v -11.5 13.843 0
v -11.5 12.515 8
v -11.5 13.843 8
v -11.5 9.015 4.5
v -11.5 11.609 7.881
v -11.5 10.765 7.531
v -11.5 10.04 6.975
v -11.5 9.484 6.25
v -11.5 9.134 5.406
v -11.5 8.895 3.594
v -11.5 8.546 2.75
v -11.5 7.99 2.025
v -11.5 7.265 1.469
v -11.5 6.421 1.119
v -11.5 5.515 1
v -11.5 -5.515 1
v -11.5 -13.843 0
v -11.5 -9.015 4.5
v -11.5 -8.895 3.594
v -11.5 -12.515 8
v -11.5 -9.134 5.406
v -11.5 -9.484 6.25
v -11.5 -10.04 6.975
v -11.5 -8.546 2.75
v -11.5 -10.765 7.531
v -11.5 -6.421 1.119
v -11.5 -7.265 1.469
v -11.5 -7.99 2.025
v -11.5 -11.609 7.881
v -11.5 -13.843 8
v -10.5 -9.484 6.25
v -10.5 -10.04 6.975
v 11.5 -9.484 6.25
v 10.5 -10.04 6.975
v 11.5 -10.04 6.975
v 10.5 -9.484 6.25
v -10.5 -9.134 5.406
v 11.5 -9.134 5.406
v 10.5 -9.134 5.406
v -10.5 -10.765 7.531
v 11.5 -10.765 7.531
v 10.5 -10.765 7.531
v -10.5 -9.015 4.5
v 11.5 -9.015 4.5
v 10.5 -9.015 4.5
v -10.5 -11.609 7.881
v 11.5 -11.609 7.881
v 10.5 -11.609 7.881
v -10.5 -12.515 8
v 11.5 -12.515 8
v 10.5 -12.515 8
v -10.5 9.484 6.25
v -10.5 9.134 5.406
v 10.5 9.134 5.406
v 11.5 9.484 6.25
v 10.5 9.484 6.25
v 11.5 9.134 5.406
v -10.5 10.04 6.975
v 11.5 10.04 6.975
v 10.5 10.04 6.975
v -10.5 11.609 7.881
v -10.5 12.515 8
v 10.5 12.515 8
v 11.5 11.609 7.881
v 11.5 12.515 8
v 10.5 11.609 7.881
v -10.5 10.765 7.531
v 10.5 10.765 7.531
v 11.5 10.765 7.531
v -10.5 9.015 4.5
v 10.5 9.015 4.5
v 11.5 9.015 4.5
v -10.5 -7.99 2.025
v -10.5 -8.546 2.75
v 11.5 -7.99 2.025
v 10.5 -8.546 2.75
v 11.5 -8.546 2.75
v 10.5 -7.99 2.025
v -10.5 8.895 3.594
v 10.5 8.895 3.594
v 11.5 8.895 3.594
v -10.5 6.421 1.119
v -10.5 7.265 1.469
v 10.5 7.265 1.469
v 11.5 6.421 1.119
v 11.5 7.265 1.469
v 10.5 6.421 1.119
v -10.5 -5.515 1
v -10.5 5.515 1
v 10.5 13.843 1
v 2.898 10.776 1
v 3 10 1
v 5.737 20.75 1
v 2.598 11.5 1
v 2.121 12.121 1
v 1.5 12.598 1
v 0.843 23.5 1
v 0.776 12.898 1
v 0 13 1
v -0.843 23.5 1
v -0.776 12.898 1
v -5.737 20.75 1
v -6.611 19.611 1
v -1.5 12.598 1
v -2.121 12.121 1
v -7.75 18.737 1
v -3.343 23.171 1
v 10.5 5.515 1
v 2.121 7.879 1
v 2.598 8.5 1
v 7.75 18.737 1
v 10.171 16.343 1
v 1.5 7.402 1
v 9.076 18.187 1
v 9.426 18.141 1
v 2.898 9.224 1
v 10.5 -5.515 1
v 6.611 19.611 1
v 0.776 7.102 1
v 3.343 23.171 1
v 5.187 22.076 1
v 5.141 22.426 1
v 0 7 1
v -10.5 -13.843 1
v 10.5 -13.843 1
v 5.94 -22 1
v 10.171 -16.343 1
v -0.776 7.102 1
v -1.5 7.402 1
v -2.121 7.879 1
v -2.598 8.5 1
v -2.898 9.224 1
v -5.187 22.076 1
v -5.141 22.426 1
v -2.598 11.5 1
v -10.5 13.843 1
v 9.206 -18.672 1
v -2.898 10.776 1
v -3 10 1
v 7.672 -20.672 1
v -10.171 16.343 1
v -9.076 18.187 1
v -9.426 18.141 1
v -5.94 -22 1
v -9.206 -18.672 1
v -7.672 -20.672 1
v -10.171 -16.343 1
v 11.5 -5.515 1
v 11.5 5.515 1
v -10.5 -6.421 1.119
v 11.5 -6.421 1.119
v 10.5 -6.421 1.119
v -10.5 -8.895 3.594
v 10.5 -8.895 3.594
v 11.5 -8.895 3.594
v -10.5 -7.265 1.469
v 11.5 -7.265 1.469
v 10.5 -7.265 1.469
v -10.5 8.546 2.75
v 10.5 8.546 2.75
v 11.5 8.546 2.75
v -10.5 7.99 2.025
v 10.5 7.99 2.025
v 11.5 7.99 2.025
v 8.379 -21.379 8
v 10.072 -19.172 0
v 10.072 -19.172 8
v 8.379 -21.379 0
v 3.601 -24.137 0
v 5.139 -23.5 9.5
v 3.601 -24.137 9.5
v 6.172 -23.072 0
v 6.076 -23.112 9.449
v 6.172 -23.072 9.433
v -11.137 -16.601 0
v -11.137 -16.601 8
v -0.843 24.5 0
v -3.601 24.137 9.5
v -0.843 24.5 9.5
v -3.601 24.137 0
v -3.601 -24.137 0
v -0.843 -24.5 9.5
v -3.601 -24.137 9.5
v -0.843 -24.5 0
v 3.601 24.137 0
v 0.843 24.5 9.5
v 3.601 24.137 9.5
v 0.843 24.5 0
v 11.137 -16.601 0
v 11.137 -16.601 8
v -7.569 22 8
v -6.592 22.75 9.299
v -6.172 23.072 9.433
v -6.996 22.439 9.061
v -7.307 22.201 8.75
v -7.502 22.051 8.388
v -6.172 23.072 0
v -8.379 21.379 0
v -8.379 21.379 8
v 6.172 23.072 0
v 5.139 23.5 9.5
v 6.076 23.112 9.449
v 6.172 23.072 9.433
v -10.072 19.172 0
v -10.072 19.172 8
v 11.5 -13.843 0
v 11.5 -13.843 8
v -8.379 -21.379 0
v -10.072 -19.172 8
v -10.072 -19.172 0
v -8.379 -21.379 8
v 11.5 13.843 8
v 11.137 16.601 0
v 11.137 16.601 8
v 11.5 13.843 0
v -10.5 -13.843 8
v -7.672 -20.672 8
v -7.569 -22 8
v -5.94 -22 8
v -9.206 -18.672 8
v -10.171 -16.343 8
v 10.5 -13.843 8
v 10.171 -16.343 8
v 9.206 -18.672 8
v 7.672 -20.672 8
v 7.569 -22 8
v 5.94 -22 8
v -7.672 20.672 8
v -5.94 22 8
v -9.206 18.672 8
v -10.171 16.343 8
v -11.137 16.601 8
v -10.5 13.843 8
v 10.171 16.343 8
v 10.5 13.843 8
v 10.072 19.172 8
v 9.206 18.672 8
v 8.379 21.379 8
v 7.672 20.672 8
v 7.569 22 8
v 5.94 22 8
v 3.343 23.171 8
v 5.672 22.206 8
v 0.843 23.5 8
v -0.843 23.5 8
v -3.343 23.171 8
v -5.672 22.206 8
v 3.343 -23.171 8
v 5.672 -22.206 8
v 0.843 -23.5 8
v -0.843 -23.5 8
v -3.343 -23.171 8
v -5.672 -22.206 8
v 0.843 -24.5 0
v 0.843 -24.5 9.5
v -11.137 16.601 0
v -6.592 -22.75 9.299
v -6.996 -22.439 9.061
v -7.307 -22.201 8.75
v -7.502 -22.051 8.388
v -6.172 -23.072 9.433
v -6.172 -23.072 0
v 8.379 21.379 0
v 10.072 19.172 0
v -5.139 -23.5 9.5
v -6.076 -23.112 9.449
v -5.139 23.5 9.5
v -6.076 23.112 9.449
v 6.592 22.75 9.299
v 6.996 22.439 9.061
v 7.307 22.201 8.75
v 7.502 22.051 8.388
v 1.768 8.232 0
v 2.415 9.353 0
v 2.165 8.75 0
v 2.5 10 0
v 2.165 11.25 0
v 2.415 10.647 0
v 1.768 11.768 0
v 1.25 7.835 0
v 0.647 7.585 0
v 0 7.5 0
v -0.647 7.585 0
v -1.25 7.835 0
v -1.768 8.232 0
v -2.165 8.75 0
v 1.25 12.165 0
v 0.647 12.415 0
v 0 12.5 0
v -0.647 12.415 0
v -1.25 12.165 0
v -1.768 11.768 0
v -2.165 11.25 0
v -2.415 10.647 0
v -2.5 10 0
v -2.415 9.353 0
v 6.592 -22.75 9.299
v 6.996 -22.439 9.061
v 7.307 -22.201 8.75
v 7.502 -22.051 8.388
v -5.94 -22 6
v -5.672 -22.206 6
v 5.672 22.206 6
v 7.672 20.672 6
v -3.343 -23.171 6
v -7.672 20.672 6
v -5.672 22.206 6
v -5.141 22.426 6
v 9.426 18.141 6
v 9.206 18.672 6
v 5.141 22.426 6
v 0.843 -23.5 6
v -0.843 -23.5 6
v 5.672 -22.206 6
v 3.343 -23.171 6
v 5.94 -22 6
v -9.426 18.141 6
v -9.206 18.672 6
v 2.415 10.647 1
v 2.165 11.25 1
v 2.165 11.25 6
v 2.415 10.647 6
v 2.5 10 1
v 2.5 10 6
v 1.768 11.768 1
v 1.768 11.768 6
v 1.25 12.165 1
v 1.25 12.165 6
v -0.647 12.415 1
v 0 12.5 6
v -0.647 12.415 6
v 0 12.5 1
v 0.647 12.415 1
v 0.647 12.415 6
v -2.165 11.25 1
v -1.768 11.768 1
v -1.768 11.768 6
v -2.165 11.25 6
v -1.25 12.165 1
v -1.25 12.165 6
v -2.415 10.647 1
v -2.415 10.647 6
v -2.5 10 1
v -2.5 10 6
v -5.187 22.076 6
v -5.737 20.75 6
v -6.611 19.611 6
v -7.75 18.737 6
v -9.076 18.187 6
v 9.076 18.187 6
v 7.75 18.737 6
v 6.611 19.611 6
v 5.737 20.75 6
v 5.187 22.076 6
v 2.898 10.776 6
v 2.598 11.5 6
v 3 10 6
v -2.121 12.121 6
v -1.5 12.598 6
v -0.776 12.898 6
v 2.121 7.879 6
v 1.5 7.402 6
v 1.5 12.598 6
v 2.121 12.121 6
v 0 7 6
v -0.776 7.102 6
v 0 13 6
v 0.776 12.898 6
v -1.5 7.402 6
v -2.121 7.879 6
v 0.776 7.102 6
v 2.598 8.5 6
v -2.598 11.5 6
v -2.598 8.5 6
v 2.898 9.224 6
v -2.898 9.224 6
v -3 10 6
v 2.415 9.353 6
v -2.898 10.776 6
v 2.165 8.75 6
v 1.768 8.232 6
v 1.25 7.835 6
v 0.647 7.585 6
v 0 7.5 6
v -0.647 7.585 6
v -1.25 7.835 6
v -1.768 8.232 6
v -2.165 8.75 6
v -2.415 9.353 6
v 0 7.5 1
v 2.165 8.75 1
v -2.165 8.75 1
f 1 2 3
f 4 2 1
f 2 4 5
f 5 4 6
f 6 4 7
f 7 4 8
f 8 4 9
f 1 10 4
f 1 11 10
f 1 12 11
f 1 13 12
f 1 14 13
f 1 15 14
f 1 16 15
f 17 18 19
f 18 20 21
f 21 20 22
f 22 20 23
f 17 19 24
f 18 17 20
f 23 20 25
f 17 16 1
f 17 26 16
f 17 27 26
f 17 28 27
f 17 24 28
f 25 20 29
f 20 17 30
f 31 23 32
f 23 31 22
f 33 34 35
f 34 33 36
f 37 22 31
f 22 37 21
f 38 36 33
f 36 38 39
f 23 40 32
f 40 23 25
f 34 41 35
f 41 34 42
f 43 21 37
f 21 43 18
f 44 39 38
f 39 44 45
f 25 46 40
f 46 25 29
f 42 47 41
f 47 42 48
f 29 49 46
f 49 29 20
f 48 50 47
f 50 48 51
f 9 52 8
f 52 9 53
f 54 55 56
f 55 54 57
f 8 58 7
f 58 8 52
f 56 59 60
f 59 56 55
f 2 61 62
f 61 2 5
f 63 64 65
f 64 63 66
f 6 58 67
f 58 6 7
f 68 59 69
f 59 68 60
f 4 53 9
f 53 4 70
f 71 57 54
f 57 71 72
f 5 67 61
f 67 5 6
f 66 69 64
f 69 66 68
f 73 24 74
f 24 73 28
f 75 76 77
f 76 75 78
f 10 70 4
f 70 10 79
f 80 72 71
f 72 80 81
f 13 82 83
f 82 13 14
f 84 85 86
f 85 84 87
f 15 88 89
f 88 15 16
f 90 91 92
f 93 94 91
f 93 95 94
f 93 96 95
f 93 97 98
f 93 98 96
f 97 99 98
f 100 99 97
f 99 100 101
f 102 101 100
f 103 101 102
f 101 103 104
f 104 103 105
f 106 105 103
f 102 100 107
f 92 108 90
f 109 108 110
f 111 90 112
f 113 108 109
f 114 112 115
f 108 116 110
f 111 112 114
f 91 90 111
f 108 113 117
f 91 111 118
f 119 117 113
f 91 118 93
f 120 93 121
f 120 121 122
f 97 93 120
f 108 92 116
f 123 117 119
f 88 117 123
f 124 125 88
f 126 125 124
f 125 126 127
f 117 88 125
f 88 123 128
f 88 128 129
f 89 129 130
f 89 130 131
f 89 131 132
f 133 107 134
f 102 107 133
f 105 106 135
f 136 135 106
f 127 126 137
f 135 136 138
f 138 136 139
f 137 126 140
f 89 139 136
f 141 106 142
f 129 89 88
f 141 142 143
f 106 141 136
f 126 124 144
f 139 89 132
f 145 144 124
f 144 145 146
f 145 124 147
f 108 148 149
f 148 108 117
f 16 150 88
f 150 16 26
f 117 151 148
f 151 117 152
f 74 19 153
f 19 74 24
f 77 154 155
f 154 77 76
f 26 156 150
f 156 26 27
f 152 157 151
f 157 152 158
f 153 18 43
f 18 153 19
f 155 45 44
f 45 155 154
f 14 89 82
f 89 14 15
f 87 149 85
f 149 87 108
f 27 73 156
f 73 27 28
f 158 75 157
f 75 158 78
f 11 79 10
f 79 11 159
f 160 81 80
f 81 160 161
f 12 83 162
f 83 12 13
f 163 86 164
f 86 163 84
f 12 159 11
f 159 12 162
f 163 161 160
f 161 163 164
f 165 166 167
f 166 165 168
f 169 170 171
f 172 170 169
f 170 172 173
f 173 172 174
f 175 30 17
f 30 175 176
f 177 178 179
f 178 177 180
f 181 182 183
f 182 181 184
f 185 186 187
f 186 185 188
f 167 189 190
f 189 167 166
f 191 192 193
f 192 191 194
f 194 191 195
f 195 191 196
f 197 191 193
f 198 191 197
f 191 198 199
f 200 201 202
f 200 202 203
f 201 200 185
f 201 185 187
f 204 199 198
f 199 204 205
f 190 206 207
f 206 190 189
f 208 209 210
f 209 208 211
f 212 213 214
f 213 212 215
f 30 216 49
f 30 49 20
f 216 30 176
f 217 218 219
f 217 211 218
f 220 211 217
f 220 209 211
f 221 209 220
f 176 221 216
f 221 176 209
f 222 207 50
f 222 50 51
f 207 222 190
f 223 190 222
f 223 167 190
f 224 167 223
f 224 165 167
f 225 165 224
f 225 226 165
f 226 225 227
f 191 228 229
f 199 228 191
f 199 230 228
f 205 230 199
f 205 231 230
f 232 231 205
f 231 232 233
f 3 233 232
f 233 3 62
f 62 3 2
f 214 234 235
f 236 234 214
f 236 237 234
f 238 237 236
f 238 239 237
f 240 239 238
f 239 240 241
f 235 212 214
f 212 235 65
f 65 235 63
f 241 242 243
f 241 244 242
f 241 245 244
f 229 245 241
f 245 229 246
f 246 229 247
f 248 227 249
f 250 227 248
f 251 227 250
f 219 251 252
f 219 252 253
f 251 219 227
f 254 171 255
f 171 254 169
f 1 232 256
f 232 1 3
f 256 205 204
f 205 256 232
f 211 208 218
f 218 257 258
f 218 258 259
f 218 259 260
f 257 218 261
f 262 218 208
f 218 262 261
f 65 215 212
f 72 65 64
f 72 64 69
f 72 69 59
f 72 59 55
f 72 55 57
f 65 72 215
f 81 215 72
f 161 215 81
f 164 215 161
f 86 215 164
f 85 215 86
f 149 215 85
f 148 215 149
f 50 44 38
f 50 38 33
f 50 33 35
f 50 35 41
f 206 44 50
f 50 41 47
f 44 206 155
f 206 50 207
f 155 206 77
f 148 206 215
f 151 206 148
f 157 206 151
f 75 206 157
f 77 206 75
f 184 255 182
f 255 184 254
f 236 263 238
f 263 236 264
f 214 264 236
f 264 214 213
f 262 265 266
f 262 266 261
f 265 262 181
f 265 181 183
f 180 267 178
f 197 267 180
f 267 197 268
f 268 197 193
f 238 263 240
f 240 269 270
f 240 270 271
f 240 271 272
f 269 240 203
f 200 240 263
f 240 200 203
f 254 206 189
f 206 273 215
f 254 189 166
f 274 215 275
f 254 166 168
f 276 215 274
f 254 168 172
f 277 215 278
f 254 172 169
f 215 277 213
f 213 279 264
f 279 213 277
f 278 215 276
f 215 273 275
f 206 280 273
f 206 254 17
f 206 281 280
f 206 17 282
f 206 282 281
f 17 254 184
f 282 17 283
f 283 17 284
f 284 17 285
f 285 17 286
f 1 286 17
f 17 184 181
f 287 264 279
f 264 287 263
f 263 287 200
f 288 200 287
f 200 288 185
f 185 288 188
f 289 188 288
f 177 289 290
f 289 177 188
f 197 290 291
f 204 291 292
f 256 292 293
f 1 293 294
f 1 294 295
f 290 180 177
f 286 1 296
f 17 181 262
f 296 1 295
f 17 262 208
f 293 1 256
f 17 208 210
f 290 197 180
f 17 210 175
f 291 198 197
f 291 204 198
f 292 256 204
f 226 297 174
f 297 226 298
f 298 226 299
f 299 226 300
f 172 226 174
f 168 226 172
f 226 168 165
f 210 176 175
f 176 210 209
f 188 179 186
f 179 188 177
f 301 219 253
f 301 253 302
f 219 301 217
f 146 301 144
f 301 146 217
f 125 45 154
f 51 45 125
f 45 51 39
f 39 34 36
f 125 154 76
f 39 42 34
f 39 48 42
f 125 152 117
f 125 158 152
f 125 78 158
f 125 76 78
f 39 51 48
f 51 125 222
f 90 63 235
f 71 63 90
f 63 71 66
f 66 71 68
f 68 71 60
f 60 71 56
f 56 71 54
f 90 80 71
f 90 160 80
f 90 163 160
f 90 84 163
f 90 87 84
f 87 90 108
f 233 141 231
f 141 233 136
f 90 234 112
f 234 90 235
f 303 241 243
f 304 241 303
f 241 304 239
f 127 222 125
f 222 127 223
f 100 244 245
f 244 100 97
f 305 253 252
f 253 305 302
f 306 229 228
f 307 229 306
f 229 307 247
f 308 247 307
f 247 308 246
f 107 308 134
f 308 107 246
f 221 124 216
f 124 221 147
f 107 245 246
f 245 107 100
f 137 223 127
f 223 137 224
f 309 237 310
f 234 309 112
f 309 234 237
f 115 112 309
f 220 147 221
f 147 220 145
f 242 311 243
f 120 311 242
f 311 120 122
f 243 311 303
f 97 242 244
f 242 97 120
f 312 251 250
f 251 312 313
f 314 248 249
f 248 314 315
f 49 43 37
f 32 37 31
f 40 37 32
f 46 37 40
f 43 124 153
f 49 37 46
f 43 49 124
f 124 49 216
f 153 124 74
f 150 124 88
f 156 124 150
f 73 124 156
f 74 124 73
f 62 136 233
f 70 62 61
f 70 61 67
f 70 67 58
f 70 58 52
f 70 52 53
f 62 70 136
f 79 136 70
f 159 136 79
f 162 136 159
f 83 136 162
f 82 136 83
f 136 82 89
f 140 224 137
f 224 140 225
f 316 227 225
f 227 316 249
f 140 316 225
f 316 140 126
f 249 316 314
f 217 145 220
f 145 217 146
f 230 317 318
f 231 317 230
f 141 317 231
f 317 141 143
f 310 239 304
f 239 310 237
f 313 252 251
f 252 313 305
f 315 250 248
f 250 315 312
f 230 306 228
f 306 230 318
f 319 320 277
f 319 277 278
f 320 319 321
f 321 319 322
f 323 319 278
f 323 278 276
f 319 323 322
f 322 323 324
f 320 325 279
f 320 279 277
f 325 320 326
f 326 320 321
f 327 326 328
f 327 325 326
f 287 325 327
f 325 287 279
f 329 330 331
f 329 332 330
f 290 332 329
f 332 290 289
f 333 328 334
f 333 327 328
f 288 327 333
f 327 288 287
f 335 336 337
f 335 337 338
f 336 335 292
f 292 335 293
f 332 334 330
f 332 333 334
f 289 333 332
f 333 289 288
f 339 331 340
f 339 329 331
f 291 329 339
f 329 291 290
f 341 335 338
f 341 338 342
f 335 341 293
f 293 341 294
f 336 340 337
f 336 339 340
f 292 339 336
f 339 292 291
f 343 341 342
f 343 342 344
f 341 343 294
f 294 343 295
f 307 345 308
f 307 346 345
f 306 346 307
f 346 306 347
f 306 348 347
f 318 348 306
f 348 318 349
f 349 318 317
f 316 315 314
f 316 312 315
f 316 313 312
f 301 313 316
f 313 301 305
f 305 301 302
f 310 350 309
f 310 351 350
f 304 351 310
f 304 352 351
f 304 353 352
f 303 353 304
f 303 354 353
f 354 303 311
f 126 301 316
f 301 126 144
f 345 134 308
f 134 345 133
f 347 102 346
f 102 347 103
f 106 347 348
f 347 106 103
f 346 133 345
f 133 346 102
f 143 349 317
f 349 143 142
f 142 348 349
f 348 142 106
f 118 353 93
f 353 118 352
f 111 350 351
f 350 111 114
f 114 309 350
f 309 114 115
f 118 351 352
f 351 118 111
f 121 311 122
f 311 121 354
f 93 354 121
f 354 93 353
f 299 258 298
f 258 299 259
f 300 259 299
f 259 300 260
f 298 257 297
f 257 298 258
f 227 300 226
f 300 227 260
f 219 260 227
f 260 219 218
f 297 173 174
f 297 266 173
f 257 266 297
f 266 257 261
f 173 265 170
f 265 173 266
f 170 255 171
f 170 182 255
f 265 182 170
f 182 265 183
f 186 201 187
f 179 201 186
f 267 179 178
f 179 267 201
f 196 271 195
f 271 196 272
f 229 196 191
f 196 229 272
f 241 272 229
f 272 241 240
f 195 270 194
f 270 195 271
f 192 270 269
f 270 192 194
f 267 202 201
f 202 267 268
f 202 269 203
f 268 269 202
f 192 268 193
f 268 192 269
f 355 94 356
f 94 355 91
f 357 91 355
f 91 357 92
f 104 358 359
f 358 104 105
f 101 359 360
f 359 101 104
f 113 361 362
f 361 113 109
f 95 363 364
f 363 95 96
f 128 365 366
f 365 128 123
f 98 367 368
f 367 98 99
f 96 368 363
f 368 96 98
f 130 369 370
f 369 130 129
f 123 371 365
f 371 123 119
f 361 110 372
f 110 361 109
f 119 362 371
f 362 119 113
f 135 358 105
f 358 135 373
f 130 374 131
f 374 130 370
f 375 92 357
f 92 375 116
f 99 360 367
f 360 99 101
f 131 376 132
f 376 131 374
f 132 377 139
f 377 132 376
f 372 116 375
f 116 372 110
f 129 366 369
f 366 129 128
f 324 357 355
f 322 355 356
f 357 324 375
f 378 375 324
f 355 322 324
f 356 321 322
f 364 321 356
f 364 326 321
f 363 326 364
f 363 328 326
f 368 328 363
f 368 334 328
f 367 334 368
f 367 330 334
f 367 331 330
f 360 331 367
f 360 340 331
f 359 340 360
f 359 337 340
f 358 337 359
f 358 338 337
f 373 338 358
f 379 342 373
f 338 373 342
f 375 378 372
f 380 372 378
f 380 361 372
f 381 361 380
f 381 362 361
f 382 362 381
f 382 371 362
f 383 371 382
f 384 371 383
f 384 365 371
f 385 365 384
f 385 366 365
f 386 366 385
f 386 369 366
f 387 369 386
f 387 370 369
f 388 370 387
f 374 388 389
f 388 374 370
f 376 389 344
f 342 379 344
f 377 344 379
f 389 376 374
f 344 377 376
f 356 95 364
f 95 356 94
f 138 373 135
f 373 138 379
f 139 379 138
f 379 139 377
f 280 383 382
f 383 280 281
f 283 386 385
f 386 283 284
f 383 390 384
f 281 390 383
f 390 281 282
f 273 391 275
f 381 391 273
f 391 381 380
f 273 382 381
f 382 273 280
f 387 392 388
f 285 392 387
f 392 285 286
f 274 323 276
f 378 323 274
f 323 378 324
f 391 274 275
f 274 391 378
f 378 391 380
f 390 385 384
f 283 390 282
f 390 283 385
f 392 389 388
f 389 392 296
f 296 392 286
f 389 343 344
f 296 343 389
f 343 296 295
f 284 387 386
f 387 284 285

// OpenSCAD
/*******************************************************************************
* Part: LightBlue Bean Sensor Box
* Rev : 0.1
* Date: 2015-01-19
*******************************************************************************/
$fn=24;
echo(str("$fn = ", $fn));
//boardRadius = 8;
boardRadius = 4 / (sqrt(2)-1);
echo(str("Board Radius = ", boardRadius));
boardLength = 47;  // bumped out 1mm after initial print test
boardWidth = 21;
boardDepth = 2;
boardStandoff = 5;
boardShellWall = 1;
supportWidth = 1.5;
beanFloor = 1;
floorBrim = 5;
cutOutRadius = (boardStandoff + boardDepth) / 2;
snapWidth = 1.5;
irY = 10;  // IR Y distance from origin
irD = 5;  // IR diameter

module boardShape(radius, length, width, height){
  // Center in X,Y and Z=0
  translate([-(width/2-radius),-(length/2-radius),0]){
    hull(){
      translate([0,0,0])
        cylinder(r=radius, h=height);
      translate([width-2*radius,0,0])
        cylinder(r=radius, h=height);
      translate([width-2*radius, length-2*radius, 0])
        cylinder(r=radius, h=height);
      translate([0, length-2*radius, 0])
        cylinder(r=radius, h=height);
    }
  }
}

// LightBlue Bean shell
difference(){
  boardShape(boardRadius + boardShellWall,
             boardLength+2*boardShellWall, 
             boardWidth+2*boardShellWall, 
             beanFloor+boardDepth+boardStandoff);
  translate([0,0,beanFloor])
    boardShape(boardRadius, 
               boardLength, 
               boardWidth, 
               boardStandoff+boardDepth);
  // Take out some wall to save material / time
  translate([-(boardWidth/2+boardShellWall),
             -(boardLength/2-1.5*boardRadius),
             beanFloor]){
    union(){
      hull(){
        translate([0,cutOutRadius,cutOutRadius])
          rotate([0,90,0]) cylinder(r=cutOutRadius, 
                                    h=boardWidth+2*boardShellWall+0.01);
        translate([0,boardLength-3*boardRadius-cutOutRadius,cutOutRadius])
          rotate([0,90,0]) cylinder(r=cutOutRadius, 
                                    h=boardWidth+2*boardShellWall+0.01);
      }
      translate([0,-cutOutRadius,cutOutRadius]){
        difference(){
          cube([boardWidth+2*boardShellWall+0.01,
                boardLength-3*boardRadius+2*cutOutRadius,
                20]);
          translate([0,0,0])
            rotate([0,90,0]) cylinder(r=cutOutRadius,
                                      h=boardWidth+2*boardShellWall+0.01);
          translate([0,boardLength-3*boardRadius+2*cutOutRadius,0])
            rotate([0,90,0]) cylinder(r=cutOutRadius,
                                      h=boardWidth+2*boardShellWall+0.01);
        }
      }
    }
  }
  // IR Opening
  translate([0,irY,0]) cylinder(h=boardStandoff+beanFloor, d=irD);

  // Take out some floor to save material / time
  /*
  boardShape(boardRadius-floorBrim, 
             boardLength-2*floorBrim,
             boardWidth-2*floorBrim,
             beanFloor);
  */
}

// LB Bean end supports
translate([0,0,beanFloor]){
  intersection(){
    boardShape(boardRadius, boardLength, boardWidth, boardStandoff);
    union(){
      // Battery side
      translate([-boardWidth/2, -boardLength/2, 0])
        cube([boardWidth,supportWidth,boardStandoff]);
      // Proto side
      translate([-boardWidth/2, boardLength/2, 0])
        cylinder(r=boardRadius*(sqrt(2)-1)+supportWidth, h=boardStandoff);
      translate([boardWidth/2, boardLength/2, 0])
        cylinder(r=boardRadius*(sqrt(2)-1)+supportWidth, h=boardStandoff);
    }
  }
}

// Clips
intersection(){
  // Create an intersection with the curve of the board / shell
  translate([0,0,beanFloor+boardStandoff+boardDepth])
    boardShape(boardRadius + boardShellWall,
               boardLength+2*boardShellWall, 
               boardWidth+2*boardShellWall, 
               snapWidth);
  union(){
    translate([-10,-boardLength/2,
               beanFloor+boardStandoff+boardDepth]){
      rotate([0,90,0]) cylinder(r=snapWidth, h=20);
      // This little bit is to sqare off the back of the clip
      translate([0,-snapWidth,-snapWidth])
        cube([20,snapWidth,2*snapWidth]);
    }
    translate([-10,boardLength/2,
               beanFloor+boardStandoff+boardDepth]){
      rotate([0,90,0]) cylinder(r=snapWidth, h=20);
      // This little bit is to sqare off the back of the clip
      translate([0,0,-snapWidth])
        cube([20,snapWidth,2*snapWidth]);
    }
  }
}

// IR support
translate([0,irY,0]) {
  difference() {
    cylinder(h=boardStandoff+beanFloor, d=irD+boardShellWall);
    cylinder(h=boardStandoff+beanFloor, d=irD);
  }
}
